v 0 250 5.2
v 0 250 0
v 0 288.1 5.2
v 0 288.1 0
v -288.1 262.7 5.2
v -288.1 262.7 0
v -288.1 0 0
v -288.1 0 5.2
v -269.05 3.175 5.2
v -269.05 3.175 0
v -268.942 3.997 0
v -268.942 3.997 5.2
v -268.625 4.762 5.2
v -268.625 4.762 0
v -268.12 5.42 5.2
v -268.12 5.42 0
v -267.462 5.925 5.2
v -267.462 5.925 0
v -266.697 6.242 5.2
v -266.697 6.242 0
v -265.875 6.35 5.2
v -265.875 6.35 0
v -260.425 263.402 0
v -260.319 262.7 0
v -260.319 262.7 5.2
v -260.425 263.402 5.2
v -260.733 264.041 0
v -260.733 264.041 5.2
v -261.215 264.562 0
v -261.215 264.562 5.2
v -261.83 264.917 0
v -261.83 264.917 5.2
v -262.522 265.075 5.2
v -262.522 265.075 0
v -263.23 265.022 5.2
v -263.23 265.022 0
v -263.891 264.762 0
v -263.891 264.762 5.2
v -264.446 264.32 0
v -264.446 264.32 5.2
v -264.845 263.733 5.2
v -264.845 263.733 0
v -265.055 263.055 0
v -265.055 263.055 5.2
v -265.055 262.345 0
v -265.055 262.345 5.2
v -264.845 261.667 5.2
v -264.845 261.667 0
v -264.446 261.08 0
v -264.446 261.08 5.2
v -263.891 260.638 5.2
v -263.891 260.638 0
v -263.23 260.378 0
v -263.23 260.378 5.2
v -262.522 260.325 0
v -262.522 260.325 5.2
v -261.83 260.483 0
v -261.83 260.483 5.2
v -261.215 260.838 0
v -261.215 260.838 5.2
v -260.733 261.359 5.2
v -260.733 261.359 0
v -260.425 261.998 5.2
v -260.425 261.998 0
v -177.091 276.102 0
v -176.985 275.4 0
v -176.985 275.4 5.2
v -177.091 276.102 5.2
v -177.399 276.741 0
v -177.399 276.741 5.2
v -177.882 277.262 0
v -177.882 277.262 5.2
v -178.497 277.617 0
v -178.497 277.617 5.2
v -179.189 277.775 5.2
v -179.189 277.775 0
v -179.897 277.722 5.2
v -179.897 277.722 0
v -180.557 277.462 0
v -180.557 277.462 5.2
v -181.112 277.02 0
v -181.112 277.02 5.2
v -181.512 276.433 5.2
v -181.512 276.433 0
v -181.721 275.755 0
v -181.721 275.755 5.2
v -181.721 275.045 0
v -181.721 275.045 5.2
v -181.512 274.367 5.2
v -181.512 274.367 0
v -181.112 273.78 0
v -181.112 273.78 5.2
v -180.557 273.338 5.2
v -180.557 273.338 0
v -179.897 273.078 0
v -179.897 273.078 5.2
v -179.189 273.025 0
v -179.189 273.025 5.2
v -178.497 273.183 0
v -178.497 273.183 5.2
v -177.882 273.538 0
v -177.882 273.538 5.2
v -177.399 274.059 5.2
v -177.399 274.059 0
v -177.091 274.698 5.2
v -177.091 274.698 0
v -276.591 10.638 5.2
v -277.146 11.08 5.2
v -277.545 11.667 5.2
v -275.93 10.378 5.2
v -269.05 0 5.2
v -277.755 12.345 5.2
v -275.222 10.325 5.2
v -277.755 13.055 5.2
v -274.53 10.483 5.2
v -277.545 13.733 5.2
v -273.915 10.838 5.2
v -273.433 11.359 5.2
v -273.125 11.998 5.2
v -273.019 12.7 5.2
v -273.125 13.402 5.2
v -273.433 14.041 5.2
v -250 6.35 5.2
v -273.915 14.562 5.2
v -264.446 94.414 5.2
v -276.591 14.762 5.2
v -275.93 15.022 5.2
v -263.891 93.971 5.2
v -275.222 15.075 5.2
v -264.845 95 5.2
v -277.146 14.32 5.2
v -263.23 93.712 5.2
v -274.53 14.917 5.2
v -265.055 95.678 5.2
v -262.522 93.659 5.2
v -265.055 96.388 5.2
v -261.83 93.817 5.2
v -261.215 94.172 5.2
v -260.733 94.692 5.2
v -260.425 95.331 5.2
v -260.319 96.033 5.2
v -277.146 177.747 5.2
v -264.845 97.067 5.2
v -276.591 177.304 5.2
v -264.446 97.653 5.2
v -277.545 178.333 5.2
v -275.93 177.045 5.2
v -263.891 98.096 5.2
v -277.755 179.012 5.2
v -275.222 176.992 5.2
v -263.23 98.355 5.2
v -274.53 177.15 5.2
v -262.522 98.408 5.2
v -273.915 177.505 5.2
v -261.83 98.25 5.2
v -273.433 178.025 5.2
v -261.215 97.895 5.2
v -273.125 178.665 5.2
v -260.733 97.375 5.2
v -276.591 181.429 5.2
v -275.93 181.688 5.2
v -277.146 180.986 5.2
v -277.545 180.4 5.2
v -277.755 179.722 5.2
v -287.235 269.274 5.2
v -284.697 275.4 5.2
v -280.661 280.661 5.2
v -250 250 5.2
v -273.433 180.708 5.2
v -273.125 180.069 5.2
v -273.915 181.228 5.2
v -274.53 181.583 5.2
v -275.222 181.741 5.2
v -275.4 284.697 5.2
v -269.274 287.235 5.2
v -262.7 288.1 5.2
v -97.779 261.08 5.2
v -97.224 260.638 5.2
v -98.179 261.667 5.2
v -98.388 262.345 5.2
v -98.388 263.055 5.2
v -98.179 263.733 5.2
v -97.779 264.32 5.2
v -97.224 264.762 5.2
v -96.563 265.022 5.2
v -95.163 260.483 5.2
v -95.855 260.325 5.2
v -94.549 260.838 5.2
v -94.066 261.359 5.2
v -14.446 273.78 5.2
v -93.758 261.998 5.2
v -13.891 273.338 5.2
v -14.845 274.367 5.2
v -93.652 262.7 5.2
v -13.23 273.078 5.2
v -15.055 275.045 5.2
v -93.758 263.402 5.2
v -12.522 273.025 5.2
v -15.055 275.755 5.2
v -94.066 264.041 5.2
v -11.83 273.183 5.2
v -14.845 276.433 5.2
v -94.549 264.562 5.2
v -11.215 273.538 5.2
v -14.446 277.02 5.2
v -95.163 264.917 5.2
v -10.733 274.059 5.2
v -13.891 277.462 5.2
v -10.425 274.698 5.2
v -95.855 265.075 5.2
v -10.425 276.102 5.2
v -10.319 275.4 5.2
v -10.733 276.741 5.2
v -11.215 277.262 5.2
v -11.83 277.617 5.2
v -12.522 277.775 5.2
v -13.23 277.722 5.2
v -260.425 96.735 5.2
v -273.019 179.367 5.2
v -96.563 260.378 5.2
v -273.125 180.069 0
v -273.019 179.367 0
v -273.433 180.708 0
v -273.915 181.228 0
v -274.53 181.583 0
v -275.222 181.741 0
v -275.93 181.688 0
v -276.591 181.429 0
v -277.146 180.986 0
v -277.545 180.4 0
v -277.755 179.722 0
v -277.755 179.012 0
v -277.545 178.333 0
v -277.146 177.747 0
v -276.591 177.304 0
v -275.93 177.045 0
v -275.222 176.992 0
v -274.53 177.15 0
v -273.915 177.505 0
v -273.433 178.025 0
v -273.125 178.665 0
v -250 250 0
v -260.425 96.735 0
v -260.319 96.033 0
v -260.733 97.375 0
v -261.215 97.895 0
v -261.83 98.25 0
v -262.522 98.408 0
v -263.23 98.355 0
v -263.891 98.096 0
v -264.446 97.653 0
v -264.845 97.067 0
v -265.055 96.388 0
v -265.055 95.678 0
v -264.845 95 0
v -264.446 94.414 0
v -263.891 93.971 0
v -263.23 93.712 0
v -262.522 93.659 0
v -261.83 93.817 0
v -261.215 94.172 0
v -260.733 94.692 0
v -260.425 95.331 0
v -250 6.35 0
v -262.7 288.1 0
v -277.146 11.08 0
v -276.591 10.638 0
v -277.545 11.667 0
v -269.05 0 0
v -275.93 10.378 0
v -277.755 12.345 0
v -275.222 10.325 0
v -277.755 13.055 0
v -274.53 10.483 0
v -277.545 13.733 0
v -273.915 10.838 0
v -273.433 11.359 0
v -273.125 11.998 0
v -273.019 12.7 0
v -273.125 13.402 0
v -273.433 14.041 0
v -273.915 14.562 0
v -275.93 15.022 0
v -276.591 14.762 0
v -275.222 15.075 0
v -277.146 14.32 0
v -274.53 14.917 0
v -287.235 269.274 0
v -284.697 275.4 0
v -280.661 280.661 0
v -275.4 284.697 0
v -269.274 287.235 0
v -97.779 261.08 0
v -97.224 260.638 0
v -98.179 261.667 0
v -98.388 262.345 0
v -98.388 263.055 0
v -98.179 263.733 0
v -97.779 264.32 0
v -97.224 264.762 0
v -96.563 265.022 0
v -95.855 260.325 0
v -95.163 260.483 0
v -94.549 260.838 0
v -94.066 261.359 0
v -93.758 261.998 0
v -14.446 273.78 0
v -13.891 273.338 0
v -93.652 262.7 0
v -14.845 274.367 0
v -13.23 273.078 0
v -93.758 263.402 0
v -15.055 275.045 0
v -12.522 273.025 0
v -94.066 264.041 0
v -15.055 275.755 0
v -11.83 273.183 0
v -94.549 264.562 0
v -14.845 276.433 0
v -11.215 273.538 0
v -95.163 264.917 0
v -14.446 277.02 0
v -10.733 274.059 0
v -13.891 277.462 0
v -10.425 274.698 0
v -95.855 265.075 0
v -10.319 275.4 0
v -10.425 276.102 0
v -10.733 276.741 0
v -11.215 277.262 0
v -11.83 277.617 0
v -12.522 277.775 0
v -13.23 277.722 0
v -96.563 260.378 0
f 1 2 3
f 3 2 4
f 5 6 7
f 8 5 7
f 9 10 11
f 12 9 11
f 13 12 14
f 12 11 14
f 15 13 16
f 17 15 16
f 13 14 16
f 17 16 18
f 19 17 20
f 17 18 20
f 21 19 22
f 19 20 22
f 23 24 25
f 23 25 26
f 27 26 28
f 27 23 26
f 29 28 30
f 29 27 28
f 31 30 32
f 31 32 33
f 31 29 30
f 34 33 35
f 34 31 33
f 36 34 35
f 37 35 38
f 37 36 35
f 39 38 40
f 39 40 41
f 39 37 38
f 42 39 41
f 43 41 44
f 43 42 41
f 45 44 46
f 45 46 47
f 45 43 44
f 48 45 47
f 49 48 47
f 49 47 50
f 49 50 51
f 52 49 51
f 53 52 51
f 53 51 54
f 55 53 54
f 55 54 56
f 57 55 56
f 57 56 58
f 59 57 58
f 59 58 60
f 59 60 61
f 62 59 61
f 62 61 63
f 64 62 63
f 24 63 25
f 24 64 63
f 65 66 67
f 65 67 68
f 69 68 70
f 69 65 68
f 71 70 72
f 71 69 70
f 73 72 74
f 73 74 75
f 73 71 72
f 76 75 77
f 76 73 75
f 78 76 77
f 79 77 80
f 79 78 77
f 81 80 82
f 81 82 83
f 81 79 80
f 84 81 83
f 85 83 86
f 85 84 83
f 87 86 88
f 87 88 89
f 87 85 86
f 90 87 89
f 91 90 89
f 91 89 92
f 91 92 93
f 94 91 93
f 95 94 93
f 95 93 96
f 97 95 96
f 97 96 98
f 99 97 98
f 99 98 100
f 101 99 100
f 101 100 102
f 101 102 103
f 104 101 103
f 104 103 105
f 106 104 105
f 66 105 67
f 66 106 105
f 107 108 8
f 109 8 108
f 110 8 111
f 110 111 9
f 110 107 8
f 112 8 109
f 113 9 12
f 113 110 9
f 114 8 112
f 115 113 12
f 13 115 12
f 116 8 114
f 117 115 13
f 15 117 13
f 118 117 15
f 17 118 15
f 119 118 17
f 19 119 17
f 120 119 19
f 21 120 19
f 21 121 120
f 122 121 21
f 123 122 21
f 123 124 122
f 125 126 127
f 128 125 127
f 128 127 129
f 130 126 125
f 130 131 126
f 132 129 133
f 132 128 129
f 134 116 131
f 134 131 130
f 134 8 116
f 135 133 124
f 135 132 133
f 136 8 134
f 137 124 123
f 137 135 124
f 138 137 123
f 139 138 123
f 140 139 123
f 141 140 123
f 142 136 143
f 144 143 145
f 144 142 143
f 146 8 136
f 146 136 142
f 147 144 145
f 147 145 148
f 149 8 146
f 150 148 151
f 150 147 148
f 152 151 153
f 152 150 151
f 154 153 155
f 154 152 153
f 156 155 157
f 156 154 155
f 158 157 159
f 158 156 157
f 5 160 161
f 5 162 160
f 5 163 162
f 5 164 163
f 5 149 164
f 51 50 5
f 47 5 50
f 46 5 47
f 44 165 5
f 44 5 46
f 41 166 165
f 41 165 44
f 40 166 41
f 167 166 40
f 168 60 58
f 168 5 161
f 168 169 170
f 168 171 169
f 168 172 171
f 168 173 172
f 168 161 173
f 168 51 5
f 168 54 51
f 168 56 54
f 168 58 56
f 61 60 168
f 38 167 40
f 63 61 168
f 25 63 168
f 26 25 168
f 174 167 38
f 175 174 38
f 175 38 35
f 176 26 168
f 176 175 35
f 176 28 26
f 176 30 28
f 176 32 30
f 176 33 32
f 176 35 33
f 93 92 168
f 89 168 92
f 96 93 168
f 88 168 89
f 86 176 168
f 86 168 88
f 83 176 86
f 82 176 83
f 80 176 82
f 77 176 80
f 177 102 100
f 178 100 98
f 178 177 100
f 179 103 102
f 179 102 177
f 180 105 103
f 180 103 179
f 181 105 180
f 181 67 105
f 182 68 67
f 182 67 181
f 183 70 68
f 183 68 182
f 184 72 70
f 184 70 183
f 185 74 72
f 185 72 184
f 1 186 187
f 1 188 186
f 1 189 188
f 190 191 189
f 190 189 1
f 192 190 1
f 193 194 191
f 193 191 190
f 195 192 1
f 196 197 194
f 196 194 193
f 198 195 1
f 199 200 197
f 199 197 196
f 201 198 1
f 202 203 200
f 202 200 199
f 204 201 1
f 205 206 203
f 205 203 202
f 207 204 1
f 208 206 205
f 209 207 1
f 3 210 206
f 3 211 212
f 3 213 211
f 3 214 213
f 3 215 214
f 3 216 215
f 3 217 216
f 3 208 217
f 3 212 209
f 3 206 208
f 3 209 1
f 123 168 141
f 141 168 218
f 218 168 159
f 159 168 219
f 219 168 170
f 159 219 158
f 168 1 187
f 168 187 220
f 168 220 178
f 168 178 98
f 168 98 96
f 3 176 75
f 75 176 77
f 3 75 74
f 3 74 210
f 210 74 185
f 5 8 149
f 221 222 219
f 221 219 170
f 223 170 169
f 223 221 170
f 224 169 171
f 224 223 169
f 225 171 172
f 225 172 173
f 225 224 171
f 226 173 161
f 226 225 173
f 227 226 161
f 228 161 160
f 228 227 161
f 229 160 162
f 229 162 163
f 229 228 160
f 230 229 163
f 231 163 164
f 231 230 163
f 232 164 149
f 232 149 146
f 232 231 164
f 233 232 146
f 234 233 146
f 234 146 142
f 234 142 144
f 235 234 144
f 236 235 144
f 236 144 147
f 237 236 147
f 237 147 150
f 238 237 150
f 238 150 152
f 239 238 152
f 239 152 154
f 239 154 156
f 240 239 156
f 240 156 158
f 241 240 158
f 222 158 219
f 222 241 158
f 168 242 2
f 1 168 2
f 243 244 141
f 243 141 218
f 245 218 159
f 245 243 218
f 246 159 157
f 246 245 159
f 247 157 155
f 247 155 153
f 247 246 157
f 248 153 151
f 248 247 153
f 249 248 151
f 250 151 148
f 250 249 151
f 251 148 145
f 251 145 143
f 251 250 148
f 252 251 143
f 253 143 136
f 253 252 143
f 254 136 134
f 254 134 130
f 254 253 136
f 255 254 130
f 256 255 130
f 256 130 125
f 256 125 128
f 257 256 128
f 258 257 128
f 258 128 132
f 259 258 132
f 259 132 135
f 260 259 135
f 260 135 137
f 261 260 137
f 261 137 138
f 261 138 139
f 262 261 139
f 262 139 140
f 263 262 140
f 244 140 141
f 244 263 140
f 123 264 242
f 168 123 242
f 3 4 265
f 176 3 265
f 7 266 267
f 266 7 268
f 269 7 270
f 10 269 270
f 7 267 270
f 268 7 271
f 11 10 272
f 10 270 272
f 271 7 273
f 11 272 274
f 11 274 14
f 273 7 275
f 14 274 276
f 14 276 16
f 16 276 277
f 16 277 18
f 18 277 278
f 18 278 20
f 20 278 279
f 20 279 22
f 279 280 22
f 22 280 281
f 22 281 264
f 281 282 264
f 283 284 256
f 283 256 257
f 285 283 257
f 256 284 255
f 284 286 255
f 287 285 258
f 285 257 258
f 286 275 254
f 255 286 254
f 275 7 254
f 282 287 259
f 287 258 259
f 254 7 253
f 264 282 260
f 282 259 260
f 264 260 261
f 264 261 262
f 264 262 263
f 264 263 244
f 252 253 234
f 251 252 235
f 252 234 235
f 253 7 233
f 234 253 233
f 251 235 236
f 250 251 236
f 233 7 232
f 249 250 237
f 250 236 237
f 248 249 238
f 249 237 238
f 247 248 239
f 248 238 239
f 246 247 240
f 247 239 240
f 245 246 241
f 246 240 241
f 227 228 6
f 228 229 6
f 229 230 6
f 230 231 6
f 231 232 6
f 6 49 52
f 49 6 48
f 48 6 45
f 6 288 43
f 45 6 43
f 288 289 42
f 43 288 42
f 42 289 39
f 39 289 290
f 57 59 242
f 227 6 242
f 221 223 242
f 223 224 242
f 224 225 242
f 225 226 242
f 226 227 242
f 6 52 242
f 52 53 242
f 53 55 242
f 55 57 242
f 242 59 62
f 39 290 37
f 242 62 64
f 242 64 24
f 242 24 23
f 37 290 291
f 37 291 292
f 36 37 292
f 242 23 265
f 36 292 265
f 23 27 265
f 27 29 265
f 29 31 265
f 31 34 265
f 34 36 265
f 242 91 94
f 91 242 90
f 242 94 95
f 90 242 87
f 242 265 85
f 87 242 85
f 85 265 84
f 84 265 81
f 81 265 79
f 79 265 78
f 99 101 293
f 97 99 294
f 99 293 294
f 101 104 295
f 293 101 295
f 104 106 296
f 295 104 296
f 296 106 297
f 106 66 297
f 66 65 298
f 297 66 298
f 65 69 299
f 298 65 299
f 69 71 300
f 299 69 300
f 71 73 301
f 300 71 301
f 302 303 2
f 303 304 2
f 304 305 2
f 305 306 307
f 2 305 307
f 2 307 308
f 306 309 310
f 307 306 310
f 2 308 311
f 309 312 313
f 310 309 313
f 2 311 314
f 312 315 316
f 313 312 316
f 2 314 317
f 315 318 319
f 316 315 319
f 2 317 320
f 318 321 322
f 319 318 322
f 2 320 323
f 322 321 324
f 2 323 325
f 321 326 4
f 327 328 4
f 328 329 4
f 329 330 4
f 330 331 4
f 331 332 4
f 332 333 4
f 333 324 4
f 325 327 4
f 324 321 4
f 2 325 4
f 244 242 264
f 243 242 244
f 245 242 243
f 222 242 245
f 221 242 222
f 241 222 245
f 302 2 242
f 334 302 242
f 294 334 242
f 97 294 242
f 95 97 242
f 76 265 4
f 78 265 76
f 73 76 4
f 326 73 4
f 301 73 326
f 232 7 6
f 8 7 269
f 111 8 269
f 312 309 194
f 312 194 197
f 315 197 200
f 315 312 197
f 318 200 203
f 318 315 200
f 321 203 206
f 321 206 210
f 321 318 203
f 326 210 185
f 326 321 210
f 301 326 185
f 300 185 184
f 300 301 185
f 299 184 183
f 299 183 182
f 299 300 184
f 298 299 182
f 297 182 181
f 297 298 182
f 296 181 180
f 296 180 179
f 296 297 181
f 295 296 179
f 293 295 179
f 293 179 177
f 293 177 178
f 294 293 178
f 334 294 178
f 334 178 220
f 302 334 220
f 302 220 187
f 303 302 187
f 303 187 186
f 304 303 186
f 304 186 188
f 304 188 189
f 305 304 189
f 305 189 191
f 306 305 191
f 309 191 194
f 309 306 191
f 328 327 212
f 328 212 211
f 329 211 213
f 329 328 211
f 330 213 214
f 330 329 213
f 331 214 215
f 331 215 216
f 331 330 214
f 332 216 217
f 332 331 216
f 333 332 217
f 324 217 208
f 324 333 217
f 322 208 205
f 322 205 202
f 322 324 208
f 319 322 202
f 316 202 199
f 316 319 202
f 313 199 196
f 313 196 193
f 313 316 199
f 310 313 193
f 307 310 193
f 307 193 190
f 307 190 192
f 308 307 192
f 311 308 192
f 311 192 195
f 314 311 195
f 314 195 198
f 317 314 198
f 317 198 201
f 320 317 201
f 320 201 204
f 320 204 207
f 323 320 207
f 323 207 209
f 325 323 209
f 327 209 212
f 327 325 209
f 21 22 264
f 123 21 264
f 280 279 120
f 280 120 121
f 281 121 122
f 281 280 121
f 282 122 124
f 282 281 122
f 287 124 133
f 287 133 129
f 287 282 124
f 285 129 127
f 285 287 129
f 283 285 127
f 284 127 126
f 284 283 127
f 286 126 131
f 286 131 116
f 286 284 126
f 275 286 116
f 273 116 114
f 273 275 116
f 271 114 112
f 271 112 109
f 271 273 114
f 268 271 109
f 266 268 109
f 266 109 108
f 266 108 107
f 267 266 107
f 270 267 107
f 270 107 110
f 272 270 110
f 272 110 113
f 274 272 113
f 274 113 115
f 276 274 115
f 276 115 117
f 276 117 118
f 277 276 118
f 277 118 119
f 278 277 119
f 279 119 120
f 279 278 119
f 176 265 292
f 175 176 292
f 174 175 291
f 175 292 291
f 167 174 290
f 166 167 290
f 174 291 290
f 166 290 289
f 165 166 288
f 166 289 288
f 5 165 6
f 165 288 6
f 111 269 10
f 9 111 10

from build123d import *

# Parameters (mm, degrees)
F1_R     = 2.38125
F2_DEPTH = 5.2


with BuildPart() as f2:
    # F1 (on Top) → F2 (new body)
    with BuildSketch(Plane.XY):
        with BuildLine():
            Line((-250, 6.35), (-250, 250))
            Line((-250, 250), (0, 250))
            Line((0, 250), (0, 288.1))
            Line((0, 288.1), (-262.7, 288.1))
            ThreePointArc((-262.7, 288.1), (-280.660512, 280.660512), (-288.1, 262.7))
            Line((-288.1, 262.7), (-288.1, 0))
            Line((-288.1, 0), (-269.05, 0))
            Line((-269.05, 0), (-269.05, 3.175))
            ThreePointArc((-269.05, 3.175), (-268.120064, 5.420064), (-265.875, 6.35))
            Line((-265.875, 6.35), (-250, 6.35))
        make_face()
        with Locations((-275.4, 12.7)):
            Circle(F1_R, mode=Mode.SUBTRACT)
        with Locations((-262.7, 96.033333)):
            Circle(F1_R, mode=Mode.SUBTRACT)
        with Locations((-275.4, 179.366667)):
            Circle(F1_R, mode=Mode.SUBTRACT)
        with Locations((-262.7, 262.7)):
            Circle(F1_R, mode=Mode.SUBTRACT)
        with Locations((-179.366667, 275.4)):
            Circle(F1_R, mode=Mode.SUBTRACT)
        with Locations((-96.033333, 262.7)):
            Circle(F1_R, mode=Mode.SUBTRACT)
        with Locations((-12.7, 275.4)):
            Circle(F1_R, mode=Mode.SUBTRACT)
    extrude(amount=F2_DEPTH)


solid = f2.part
